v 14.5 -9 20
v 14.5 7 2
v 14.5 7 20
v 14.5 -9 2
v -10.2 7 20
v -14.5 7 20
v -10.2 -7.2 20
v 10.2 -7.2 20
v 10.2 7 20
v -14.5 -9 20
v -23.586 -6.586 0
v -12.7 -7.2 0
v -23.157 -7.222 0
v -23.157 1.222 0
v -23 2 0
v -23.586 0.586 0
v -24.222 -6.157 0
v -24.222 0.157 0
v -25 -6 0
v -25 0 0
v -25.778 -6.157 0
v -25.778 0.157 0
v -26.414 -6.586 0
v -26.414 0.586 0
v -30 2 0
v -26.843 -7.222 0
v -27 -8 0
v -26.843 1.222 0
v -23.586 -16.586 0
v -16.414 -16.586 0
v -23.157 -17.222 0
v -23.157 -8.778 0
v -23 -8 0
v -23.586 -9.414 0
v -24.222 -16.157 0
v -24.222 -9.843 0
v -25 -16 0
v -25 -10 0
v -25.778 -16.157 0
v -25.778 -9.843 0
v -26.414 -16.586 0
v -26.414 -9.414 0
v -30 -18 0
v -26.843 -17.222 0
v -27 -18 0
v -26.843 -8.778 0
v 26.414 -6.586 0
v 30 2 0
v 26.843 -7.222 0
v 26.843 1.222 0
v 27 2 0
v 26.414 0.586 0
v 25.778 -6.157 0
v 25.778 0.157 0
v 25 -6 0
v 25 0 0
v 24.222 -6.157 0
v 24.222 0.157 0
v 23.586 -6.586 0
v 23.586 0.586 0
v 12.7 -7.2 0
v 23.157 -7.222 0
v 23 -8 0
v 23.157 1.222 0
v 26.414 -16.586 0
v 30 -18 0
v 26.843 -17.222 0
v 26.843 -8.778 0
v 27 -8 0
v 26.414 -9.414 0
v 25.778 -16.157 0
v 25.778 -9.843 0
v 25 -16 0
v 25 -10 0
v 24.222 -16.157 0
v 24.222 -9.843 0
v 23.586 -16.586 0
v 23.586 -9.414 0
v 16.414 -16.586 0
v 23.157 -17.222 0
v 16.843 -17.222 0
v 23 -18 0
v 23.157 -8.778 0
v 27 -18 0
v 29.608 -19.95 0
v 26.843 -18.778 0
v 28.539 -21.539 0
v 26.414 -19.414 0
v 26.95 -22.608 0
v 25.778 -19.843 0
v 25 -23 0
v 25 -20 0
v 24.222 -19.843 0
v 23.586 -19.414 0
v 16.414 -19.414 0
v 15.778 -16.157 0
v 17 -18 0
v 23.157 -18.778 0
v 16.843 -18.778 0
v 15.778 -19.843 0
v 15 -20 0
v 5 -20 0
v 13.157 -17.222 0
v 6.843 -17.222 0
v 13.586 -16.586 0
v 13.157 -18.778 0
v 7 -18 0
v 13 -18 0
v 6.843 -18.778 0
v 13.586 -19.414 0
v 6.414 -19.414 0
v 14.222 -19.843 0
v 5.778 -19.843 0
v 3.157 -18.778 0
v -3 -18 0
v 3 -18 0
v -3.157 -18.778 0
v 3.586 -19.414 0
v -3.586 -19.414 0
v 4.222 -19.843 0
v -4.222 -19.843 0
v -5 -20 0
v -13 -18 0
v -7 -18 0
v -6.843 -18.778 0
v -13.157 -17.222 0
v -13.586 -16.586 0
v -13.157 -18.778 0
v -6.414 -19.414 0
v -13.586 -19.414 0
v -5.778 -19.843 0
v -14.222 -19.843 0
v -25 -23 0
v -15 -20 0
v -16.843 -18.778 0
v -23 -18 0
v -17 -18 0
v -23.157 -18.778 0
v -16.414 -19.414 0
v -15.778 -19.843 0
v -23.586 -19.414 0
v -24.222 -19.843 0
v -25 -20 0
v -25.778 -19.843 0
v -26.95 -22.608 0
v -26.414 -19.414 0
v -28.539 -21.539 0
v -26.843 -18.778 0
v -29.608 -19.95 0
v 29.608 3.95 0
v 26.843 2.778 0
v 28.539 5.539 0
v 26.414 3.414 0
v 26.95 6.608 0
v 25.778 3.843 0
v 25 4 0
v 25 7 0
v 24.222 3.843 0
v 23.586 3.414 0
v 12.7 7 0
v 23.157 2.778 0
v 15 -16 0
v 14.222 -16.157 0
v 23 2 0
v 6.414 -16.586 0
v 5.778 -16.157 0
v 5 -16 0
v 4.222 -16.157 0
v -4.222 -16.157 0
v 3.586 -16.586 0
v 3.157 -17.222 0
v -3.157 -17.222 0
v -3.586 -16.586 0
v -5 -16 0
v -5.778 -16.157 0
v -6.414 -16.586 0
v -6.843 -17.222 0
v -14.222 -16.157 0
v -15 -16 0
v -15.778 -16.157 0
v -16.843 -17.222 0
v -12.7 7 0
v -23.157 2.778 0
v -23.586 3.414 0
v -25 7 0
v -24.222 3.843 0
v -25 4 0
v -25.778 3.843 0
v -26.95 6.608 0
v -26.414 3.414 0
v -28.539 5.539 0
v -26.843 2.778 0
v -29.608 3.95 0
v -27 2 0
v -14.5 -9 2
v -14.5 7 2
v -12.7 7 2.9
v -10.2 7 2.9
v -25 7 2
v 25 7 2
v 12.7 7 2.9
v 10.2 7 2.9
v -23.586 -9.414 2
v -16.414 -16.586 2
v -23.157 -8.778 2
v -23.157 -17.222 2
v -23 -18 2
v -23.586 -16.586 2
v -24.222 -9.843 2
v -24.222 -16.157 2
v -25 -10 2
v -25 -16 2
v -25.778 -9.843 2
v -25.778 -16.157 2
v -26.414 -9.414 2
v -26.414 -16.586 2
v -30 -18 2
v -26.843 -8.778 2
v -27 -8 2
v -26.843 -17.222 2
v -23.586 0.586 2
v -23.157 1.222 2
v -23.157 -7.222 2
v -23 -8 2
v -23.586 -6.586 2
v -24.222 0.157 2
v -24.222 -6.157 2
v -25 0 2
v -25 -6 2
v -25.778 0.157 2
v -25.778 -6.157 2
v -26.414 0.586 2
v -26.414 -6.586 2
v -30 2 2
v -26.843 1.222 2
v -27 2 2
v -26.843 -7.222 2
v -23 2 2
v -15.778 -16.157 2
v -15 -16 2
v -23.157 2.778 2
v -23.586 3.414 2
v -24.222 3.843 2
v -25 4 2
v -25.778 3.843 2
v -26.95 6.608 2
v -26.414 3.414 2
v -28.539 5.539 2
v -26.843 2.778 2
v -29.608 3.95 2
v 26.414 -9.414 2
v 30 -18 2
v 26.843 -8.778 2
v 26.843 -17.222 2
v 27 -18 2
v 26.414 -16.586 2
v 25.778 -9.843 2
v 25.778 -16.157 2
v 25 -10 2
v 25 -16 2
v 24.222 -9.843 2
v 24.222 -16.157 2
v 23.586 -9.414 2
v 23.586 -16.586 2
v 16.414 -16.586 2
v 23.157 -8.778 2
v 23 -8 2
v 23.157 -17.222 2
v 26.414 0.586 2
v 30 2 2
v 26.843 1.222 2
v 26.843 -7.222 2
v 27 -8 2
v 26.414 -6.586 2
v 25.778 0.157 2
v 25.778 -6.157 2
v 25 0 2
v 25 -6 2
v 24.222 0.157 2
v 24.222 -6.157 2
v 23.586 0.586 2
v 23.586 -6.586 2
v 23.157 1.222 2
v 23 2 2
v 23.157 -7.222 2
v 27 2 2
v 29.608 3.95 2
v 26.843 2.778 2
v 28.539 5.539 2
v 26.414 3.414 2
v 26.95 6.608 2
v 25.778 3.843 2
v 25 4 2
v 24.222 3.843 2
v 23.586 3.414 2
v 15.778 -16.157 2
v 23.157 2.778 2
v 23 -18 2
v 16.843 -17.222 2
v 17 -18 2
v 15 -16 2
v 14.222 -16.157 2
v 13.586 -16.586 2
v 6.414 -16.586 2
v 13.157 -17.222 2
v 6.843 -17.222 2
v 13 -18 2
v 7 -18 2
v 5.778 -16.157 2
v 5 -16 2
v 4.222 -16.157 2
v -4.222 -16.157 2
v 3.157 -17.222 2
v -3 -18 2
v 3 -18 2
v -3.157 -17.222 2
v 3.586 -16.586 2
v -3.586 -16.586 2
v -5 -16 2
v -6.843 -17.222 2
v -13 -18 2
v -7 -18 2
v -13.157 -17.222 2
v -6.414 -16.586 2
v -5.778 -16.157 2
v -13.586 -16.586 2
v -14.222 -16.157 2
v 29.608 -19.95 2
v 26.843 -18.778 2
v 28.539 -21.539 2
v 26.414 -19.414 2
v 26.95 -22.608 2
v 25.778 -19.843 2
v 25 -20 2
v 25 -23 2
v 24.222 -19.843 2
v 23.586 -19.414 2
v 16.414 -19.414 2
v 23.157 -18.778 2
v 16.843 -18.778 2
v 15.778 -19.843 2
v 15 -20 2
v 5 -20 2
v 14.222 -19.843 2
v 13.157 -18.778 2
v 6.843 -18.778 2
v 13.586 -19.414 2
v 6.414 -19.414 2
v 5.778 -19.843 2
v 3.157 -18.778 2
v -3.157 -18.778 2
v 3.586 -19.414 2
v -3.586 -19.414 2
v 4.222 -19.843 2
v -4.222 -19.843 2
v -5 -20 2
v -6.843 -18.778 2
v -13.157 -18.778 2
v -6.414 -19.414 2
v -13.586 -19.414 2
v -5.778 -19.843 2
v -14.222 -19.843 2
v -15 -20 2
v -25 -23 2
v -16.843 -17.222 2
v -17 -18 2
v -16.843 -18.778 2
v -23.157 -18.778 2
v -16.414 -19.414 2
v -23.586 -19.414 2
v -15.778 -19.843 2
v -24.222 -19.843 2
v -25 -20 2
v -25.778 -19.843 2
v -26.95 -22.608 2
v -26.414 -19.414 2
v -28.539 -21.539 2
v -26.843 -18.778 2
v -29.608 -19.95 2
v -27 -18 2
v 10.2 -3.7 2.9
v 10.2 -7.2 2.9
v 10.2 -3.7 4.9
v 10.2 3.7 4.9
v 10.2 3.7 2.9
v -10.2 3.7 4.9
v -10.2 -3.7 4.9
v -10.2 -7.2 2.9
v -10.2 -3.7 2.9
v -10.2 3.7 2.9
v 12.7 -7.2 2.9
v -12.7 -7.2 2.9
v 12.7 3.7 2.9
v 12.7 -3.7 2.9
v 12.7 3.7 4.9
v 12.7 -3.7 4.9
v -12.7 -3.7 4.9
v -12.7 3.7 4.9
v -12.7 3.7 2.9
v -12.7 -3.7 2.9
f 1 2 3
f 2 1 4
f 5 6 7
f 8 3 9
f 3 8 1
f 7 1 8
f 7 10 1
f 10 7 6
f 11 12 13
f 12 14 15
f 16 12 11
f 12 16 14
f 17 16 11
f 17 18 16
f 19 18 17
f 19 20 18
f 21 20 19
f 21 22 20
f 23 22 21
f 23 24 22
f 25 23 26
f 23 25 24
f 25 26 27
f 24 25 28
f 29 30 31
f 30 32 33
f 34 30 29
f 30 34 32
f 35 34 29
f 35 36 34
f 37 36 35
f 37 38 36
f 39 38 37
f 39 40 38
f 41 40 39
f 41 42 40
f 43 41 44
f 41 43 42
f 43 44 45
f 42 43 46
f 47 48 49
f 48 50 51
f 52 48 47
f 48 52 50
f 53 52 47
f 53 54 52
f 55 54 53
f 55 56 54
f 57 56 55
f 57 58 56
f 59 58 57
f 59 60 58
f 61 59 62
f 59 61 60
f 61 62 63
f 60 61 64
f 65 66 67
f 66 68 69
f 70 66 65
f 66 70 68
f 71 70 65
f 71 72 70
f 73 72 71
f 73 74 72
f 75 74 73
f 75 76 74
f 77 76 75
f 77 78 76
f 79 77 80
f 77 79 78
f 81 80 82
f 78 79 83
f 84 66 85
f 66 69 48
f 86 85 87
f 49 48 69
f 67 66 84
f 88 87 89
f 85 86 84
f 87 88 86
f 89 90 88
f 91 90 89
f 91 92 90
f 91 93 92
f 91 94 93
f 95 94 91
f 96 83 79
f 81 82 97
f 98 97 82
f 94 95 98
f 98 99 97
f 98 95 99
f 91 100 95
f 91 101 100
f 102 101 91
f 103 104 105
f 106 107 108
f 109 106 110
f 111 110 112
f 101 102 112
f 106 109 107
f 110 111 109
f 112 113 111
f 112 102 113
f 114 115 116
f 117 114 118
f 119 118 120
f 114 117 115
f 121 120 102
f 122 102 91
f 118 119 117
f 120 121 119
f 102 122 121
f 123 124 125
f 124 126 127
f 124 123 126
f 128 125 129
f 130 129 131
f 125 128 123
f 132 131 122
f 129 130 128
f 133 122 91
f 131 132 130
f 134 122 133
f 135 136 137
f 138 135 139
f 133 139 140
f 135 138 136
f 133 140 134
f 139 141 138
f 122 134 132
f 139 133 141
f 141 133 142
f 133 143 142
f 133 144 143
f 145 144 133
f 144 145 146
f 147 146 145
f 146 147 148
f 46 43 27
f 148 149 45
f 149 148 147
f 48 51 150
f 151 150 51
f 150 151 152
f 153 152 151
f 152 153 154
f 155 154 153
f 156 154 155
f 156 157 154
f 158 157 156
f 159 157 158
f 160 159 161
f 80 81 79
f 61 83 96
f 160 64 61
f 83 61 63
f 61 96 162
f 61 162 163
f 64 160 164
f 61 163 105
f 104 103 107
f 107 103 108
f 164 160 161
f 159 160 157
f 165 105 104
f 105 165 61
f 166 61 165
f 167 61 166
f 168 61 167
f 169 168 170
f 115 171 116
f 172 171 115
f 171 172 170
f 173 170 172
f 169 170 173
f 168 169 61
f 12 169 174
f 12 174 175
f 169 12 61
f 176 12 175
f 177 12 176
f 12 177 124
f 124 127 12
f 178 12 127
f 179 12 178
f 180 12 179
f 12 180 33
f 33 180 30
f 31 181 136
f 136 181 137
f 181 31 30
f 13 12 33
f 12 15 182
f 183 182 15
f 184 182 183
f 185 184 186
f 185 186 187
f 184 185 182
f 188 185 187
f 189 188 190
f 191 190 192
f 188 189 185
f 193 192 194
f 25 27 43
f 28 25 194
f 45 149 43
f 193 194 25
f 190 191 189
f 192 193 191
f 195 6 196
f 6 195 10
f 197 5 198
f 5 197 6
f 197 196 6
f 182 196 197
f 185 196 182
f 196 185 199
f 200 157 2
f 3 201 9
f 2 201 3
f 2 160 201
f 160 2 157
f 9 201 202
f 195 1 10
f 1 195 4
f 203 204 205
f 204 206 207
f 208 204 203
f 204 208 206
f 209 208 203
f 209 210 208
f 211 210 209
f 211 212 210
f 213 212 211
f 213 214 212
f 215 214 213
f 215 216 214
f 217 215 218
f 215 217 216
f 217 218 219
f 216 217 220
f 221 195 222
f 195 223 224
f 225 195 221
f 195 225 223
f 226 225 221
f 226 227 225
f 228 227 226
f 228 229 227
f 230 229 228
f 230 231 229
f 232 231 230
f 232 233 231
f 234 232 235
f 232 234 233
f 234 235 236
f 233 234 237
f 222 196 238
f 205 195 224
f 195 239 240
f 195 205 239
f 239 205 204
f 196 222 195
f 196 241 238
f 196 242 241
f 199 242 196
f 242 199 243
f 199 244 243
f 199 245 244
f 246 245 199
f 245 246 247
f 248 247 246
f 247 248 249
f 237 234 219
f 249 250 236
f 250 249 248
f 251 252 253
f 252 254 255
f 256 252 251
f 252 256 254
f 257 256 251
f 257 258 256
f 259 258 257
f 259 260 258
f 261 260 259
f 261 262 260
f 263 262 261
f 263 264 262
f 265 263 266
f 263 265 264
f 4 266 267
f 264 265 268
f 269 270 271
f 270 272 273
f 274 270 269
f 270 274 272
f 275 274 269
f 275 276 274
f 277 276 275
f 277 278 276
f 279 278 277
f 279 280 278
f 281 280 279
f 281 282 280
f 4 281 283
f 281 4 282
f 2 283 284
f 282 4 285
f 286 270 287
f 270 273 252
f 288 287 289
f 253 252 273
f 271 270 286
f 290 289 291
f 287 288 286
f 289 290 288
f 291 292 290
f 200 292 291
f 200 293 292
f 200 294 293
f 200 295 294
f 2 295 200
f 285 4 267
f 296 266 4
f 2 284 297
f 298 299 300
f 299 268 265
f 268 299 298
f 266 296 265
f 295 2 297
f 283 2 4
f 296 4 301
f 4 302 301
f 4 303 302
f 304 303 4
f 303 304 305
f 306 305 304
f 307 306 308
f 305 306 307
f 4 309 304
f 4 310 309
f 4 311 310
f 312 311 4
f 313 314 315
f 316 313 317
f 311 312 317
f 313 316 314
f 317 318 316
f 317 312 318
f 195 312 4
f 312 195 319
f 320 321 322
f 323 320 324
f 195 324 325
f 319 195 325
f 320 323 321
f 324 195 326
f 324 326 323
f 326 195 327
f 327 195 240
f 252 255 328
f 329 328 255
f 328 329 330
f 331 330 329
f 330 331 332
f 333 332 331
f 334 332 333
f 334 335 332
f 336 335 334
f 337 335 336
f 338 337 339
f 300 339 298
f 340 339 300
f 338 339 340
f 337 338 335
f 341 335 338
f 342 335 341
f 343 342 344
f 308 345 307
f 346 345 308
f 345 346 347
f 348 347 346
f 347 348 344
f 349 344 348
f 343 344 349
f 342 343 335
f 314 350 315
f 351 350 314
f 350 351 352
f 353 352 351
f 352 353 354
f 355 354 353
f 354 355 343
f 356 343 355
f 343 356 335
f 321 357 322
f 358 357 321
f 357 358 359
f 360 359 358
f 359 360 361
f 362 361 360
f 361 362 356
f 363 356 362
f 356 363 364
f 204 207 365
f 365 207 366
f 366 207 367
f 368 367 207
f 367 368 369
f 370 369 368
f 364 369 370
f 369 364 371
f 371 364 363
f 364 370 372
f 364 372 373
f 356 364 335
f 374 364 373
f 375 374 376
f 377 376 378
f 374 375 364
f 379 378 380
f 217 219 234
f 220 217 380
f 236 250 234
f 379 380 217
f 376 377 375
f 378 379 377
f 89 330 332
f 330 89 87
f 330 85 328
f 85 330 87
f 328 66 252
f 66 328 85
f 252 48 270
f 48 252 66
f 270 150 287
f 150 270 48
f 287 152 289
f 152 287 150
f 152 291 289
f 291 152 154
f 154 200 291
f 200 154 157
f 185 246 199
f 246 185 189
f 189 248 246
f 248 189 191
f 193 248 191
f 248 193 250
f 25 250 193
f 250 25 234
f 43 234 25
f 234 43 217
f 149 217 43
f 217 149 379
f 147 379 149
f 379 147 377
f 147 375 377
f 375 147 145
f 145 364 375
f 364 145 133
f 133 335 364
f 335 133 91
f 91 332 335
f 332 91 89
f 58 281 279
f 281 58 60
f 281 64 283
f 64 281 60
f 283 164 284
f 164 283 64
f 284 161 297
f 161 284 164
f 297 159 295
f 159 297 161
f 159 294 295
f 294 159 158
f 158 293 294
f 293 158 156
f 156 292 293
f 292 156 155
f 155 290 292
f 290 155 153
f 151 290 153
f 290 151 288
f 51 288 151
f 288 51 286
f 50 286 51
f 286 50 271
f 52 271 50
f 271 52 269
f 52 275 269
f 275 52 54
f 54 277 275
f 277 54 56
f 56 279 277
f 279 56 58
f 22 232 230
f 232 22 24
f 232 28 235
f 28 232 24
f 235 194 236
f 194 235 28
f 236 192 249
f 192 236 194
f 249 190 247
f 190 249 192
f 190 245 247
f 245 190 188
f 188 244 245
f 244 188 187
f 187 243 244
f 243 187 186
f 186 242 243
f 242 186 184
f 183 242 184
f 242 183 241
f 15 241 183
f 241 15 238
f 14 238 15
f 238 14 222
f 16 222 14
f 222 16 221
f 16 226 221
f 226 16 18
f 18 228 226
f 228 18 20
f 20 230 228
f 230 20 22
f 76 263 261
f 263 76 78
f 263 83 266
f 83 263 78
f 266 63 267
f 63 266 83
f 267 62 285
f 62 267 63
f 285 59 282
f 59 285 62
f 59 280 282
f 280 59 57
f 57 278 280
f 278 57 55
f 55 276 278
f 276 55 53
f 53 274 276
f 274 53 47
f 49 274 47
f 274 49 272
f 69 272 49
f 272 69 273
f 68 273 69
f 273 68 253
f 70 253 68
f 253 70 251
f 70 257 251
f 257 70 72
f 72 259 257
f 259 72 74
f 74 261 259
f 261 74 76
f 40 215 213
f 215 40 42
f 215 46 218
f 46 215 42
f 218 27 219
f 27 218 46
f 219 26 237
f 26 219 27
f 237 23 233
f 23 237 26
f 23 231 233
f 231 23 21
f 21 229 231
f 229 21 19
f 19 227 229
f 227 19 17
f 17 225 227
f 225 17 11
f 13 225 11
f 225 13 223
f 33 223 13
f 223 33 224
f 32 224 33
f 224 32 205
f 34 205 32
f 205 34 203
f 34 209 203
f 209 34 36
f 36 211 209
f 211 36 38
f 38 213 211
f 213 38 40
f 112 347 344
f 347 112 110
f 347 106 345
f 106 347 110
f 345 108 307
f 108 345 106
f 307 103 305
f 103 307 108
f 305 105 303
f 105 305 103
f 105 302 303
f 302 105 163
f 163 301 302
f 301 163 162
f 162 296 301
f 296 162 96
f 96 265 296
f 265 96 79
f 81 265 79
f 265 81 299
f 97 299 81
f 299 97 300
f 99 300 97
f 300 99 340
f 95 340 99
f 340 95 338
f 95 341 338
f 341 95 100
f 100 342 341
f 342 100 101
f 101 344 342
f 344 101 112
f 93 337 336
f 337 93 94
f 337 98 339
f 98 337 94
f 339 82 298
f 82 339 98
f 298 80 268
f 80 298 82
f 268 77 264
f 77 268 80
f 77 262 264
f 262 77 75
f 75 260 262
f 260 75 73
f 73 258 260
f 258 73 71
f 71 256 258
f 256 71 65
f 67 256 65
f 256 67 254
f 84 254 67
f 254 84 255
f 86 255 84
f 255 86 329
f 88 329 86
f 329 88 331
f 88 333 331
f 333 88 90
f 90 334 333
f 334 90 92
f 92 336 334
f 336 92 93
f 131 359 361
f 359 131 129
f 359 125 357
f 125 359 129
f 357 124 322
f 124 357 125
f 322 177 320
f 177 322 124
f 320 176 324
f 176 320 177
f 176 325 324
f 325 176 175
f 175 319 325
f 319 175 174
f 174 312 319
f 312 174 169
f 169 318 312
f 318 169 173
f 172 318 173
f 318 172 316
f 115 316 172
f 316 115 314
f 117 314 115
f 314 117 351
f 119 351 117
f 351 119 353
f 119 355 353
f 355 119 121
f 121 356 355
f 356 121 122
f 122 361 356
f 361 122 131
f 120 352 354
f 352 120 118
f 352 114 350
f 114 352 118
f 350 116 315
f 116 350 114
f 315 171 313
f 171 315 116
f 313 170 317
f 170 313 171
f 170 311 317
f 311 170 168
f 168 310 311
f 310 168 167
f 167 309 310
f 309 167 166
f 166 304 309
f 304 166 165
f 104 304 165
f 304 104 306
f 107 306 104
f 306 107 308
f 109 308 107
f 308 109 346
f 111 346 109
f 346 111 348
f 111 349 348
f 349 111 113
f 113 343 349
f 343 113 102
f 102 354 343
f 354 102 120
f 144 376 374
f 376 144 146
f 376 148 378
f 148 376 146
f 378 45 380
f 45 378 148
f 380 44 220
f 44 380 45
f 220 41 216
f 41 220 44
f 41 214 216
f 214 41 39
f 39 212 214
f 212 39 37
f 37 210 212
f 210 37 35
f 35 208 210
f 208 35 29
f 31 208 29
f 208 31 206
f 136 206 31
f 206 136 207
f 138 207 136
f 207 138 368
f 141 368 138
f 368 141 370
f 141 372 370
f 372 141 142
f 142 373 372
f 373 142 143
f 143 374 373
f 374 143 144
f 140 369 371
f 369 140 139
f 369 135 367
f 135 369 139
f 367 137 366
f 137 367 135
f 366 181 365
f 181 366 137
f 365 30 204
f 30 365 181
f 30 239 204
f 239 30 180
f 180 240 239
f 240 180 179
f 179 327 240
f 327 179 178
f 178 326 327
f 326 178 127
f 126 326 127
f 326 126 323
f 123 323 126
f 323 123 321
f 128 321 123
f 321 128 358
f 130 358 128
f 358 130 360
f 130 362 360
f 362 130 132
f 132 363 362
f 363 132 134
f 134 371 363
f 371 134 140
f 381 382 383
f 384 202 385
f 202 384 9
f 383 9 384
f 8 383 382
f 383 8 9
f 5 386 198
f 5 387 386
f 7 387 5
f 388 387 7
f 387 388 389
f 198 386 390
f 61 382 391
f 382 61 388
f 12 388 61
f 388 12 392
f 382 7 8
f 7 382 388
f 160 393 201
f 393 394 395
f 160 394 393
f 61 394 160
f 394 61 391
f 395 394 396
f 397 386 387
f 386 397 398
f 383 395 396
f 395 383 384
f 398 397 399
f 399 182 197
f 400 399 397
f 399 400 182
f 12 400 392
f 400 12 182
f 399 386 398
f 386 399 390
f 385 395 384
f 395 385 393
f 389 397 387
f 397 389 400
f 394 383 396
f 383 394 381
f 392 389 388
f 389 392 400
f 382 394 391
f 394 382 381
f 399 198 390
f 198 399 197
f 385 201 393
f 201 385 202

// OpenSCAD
//print_error = 0.0;
print_error = 0.2;

motor_fix(print_error=print_error);

module motor_fix(print_error=0) {
  // главный блок с шестеренками
  mlenx_1 = 20;
  // защелка
  mlenx_2 = 25;
  // рамка
  mlenx_3 = 25;
  // блок с мотором
  mlenx_4 = 23;
    
  // главный блок с шестеренками
  mleny_1 = 14;
  // защелка
  mleny_2 = 7;
  // рамка
  mleny_3 = 14;
  // блок с мотором
  mleny_4 = 12;
  
  // защелка
  mlenz_2 = 2;
  // рамка
  mlenz_3 = 3;
    
  // всё центрируем по x и по y
  difference() {
    union() {
      // по ширине рамки + стенки 2мм
      translate([-(mlenx_3+4)/2, -mleny_1/2-2, 0]) cube([mlenx_3+4, mleny_1+2, 20]);
      // крепления на корпус
      linear_extrude(height=2) import(file="корпус-43d.dxf");
      //translate([-2, 2, 20]) cube([mlenx_1, mleny_1, 2]);
    }
    // главный блок с шестеренками
    translate([-mlenx_1/2-print_error, -mleny_1/2-print_error, -0.1]) 
      cube([mlenx_1+print_error*2, mleny_1+print_error*2+0.1, 22+0.2]);
    // защелки
    translate([-mlenx_2/2-print_error, -mleny_2/2-print_error, -0.1]) 
      cube([mlenx_2+print_error*2, mleny_2+print_error*2, mlenz_3+mlenz_2]);
    // рамка вокруг мотора
    translate([-mlenx_3/2-print_error, -mleny_3/2-print_error, -0.1]) 
      cube([mlenx_3+print_error*2, mleny_3+print_error*2+0.1, mlenz_3]);
  }
}
